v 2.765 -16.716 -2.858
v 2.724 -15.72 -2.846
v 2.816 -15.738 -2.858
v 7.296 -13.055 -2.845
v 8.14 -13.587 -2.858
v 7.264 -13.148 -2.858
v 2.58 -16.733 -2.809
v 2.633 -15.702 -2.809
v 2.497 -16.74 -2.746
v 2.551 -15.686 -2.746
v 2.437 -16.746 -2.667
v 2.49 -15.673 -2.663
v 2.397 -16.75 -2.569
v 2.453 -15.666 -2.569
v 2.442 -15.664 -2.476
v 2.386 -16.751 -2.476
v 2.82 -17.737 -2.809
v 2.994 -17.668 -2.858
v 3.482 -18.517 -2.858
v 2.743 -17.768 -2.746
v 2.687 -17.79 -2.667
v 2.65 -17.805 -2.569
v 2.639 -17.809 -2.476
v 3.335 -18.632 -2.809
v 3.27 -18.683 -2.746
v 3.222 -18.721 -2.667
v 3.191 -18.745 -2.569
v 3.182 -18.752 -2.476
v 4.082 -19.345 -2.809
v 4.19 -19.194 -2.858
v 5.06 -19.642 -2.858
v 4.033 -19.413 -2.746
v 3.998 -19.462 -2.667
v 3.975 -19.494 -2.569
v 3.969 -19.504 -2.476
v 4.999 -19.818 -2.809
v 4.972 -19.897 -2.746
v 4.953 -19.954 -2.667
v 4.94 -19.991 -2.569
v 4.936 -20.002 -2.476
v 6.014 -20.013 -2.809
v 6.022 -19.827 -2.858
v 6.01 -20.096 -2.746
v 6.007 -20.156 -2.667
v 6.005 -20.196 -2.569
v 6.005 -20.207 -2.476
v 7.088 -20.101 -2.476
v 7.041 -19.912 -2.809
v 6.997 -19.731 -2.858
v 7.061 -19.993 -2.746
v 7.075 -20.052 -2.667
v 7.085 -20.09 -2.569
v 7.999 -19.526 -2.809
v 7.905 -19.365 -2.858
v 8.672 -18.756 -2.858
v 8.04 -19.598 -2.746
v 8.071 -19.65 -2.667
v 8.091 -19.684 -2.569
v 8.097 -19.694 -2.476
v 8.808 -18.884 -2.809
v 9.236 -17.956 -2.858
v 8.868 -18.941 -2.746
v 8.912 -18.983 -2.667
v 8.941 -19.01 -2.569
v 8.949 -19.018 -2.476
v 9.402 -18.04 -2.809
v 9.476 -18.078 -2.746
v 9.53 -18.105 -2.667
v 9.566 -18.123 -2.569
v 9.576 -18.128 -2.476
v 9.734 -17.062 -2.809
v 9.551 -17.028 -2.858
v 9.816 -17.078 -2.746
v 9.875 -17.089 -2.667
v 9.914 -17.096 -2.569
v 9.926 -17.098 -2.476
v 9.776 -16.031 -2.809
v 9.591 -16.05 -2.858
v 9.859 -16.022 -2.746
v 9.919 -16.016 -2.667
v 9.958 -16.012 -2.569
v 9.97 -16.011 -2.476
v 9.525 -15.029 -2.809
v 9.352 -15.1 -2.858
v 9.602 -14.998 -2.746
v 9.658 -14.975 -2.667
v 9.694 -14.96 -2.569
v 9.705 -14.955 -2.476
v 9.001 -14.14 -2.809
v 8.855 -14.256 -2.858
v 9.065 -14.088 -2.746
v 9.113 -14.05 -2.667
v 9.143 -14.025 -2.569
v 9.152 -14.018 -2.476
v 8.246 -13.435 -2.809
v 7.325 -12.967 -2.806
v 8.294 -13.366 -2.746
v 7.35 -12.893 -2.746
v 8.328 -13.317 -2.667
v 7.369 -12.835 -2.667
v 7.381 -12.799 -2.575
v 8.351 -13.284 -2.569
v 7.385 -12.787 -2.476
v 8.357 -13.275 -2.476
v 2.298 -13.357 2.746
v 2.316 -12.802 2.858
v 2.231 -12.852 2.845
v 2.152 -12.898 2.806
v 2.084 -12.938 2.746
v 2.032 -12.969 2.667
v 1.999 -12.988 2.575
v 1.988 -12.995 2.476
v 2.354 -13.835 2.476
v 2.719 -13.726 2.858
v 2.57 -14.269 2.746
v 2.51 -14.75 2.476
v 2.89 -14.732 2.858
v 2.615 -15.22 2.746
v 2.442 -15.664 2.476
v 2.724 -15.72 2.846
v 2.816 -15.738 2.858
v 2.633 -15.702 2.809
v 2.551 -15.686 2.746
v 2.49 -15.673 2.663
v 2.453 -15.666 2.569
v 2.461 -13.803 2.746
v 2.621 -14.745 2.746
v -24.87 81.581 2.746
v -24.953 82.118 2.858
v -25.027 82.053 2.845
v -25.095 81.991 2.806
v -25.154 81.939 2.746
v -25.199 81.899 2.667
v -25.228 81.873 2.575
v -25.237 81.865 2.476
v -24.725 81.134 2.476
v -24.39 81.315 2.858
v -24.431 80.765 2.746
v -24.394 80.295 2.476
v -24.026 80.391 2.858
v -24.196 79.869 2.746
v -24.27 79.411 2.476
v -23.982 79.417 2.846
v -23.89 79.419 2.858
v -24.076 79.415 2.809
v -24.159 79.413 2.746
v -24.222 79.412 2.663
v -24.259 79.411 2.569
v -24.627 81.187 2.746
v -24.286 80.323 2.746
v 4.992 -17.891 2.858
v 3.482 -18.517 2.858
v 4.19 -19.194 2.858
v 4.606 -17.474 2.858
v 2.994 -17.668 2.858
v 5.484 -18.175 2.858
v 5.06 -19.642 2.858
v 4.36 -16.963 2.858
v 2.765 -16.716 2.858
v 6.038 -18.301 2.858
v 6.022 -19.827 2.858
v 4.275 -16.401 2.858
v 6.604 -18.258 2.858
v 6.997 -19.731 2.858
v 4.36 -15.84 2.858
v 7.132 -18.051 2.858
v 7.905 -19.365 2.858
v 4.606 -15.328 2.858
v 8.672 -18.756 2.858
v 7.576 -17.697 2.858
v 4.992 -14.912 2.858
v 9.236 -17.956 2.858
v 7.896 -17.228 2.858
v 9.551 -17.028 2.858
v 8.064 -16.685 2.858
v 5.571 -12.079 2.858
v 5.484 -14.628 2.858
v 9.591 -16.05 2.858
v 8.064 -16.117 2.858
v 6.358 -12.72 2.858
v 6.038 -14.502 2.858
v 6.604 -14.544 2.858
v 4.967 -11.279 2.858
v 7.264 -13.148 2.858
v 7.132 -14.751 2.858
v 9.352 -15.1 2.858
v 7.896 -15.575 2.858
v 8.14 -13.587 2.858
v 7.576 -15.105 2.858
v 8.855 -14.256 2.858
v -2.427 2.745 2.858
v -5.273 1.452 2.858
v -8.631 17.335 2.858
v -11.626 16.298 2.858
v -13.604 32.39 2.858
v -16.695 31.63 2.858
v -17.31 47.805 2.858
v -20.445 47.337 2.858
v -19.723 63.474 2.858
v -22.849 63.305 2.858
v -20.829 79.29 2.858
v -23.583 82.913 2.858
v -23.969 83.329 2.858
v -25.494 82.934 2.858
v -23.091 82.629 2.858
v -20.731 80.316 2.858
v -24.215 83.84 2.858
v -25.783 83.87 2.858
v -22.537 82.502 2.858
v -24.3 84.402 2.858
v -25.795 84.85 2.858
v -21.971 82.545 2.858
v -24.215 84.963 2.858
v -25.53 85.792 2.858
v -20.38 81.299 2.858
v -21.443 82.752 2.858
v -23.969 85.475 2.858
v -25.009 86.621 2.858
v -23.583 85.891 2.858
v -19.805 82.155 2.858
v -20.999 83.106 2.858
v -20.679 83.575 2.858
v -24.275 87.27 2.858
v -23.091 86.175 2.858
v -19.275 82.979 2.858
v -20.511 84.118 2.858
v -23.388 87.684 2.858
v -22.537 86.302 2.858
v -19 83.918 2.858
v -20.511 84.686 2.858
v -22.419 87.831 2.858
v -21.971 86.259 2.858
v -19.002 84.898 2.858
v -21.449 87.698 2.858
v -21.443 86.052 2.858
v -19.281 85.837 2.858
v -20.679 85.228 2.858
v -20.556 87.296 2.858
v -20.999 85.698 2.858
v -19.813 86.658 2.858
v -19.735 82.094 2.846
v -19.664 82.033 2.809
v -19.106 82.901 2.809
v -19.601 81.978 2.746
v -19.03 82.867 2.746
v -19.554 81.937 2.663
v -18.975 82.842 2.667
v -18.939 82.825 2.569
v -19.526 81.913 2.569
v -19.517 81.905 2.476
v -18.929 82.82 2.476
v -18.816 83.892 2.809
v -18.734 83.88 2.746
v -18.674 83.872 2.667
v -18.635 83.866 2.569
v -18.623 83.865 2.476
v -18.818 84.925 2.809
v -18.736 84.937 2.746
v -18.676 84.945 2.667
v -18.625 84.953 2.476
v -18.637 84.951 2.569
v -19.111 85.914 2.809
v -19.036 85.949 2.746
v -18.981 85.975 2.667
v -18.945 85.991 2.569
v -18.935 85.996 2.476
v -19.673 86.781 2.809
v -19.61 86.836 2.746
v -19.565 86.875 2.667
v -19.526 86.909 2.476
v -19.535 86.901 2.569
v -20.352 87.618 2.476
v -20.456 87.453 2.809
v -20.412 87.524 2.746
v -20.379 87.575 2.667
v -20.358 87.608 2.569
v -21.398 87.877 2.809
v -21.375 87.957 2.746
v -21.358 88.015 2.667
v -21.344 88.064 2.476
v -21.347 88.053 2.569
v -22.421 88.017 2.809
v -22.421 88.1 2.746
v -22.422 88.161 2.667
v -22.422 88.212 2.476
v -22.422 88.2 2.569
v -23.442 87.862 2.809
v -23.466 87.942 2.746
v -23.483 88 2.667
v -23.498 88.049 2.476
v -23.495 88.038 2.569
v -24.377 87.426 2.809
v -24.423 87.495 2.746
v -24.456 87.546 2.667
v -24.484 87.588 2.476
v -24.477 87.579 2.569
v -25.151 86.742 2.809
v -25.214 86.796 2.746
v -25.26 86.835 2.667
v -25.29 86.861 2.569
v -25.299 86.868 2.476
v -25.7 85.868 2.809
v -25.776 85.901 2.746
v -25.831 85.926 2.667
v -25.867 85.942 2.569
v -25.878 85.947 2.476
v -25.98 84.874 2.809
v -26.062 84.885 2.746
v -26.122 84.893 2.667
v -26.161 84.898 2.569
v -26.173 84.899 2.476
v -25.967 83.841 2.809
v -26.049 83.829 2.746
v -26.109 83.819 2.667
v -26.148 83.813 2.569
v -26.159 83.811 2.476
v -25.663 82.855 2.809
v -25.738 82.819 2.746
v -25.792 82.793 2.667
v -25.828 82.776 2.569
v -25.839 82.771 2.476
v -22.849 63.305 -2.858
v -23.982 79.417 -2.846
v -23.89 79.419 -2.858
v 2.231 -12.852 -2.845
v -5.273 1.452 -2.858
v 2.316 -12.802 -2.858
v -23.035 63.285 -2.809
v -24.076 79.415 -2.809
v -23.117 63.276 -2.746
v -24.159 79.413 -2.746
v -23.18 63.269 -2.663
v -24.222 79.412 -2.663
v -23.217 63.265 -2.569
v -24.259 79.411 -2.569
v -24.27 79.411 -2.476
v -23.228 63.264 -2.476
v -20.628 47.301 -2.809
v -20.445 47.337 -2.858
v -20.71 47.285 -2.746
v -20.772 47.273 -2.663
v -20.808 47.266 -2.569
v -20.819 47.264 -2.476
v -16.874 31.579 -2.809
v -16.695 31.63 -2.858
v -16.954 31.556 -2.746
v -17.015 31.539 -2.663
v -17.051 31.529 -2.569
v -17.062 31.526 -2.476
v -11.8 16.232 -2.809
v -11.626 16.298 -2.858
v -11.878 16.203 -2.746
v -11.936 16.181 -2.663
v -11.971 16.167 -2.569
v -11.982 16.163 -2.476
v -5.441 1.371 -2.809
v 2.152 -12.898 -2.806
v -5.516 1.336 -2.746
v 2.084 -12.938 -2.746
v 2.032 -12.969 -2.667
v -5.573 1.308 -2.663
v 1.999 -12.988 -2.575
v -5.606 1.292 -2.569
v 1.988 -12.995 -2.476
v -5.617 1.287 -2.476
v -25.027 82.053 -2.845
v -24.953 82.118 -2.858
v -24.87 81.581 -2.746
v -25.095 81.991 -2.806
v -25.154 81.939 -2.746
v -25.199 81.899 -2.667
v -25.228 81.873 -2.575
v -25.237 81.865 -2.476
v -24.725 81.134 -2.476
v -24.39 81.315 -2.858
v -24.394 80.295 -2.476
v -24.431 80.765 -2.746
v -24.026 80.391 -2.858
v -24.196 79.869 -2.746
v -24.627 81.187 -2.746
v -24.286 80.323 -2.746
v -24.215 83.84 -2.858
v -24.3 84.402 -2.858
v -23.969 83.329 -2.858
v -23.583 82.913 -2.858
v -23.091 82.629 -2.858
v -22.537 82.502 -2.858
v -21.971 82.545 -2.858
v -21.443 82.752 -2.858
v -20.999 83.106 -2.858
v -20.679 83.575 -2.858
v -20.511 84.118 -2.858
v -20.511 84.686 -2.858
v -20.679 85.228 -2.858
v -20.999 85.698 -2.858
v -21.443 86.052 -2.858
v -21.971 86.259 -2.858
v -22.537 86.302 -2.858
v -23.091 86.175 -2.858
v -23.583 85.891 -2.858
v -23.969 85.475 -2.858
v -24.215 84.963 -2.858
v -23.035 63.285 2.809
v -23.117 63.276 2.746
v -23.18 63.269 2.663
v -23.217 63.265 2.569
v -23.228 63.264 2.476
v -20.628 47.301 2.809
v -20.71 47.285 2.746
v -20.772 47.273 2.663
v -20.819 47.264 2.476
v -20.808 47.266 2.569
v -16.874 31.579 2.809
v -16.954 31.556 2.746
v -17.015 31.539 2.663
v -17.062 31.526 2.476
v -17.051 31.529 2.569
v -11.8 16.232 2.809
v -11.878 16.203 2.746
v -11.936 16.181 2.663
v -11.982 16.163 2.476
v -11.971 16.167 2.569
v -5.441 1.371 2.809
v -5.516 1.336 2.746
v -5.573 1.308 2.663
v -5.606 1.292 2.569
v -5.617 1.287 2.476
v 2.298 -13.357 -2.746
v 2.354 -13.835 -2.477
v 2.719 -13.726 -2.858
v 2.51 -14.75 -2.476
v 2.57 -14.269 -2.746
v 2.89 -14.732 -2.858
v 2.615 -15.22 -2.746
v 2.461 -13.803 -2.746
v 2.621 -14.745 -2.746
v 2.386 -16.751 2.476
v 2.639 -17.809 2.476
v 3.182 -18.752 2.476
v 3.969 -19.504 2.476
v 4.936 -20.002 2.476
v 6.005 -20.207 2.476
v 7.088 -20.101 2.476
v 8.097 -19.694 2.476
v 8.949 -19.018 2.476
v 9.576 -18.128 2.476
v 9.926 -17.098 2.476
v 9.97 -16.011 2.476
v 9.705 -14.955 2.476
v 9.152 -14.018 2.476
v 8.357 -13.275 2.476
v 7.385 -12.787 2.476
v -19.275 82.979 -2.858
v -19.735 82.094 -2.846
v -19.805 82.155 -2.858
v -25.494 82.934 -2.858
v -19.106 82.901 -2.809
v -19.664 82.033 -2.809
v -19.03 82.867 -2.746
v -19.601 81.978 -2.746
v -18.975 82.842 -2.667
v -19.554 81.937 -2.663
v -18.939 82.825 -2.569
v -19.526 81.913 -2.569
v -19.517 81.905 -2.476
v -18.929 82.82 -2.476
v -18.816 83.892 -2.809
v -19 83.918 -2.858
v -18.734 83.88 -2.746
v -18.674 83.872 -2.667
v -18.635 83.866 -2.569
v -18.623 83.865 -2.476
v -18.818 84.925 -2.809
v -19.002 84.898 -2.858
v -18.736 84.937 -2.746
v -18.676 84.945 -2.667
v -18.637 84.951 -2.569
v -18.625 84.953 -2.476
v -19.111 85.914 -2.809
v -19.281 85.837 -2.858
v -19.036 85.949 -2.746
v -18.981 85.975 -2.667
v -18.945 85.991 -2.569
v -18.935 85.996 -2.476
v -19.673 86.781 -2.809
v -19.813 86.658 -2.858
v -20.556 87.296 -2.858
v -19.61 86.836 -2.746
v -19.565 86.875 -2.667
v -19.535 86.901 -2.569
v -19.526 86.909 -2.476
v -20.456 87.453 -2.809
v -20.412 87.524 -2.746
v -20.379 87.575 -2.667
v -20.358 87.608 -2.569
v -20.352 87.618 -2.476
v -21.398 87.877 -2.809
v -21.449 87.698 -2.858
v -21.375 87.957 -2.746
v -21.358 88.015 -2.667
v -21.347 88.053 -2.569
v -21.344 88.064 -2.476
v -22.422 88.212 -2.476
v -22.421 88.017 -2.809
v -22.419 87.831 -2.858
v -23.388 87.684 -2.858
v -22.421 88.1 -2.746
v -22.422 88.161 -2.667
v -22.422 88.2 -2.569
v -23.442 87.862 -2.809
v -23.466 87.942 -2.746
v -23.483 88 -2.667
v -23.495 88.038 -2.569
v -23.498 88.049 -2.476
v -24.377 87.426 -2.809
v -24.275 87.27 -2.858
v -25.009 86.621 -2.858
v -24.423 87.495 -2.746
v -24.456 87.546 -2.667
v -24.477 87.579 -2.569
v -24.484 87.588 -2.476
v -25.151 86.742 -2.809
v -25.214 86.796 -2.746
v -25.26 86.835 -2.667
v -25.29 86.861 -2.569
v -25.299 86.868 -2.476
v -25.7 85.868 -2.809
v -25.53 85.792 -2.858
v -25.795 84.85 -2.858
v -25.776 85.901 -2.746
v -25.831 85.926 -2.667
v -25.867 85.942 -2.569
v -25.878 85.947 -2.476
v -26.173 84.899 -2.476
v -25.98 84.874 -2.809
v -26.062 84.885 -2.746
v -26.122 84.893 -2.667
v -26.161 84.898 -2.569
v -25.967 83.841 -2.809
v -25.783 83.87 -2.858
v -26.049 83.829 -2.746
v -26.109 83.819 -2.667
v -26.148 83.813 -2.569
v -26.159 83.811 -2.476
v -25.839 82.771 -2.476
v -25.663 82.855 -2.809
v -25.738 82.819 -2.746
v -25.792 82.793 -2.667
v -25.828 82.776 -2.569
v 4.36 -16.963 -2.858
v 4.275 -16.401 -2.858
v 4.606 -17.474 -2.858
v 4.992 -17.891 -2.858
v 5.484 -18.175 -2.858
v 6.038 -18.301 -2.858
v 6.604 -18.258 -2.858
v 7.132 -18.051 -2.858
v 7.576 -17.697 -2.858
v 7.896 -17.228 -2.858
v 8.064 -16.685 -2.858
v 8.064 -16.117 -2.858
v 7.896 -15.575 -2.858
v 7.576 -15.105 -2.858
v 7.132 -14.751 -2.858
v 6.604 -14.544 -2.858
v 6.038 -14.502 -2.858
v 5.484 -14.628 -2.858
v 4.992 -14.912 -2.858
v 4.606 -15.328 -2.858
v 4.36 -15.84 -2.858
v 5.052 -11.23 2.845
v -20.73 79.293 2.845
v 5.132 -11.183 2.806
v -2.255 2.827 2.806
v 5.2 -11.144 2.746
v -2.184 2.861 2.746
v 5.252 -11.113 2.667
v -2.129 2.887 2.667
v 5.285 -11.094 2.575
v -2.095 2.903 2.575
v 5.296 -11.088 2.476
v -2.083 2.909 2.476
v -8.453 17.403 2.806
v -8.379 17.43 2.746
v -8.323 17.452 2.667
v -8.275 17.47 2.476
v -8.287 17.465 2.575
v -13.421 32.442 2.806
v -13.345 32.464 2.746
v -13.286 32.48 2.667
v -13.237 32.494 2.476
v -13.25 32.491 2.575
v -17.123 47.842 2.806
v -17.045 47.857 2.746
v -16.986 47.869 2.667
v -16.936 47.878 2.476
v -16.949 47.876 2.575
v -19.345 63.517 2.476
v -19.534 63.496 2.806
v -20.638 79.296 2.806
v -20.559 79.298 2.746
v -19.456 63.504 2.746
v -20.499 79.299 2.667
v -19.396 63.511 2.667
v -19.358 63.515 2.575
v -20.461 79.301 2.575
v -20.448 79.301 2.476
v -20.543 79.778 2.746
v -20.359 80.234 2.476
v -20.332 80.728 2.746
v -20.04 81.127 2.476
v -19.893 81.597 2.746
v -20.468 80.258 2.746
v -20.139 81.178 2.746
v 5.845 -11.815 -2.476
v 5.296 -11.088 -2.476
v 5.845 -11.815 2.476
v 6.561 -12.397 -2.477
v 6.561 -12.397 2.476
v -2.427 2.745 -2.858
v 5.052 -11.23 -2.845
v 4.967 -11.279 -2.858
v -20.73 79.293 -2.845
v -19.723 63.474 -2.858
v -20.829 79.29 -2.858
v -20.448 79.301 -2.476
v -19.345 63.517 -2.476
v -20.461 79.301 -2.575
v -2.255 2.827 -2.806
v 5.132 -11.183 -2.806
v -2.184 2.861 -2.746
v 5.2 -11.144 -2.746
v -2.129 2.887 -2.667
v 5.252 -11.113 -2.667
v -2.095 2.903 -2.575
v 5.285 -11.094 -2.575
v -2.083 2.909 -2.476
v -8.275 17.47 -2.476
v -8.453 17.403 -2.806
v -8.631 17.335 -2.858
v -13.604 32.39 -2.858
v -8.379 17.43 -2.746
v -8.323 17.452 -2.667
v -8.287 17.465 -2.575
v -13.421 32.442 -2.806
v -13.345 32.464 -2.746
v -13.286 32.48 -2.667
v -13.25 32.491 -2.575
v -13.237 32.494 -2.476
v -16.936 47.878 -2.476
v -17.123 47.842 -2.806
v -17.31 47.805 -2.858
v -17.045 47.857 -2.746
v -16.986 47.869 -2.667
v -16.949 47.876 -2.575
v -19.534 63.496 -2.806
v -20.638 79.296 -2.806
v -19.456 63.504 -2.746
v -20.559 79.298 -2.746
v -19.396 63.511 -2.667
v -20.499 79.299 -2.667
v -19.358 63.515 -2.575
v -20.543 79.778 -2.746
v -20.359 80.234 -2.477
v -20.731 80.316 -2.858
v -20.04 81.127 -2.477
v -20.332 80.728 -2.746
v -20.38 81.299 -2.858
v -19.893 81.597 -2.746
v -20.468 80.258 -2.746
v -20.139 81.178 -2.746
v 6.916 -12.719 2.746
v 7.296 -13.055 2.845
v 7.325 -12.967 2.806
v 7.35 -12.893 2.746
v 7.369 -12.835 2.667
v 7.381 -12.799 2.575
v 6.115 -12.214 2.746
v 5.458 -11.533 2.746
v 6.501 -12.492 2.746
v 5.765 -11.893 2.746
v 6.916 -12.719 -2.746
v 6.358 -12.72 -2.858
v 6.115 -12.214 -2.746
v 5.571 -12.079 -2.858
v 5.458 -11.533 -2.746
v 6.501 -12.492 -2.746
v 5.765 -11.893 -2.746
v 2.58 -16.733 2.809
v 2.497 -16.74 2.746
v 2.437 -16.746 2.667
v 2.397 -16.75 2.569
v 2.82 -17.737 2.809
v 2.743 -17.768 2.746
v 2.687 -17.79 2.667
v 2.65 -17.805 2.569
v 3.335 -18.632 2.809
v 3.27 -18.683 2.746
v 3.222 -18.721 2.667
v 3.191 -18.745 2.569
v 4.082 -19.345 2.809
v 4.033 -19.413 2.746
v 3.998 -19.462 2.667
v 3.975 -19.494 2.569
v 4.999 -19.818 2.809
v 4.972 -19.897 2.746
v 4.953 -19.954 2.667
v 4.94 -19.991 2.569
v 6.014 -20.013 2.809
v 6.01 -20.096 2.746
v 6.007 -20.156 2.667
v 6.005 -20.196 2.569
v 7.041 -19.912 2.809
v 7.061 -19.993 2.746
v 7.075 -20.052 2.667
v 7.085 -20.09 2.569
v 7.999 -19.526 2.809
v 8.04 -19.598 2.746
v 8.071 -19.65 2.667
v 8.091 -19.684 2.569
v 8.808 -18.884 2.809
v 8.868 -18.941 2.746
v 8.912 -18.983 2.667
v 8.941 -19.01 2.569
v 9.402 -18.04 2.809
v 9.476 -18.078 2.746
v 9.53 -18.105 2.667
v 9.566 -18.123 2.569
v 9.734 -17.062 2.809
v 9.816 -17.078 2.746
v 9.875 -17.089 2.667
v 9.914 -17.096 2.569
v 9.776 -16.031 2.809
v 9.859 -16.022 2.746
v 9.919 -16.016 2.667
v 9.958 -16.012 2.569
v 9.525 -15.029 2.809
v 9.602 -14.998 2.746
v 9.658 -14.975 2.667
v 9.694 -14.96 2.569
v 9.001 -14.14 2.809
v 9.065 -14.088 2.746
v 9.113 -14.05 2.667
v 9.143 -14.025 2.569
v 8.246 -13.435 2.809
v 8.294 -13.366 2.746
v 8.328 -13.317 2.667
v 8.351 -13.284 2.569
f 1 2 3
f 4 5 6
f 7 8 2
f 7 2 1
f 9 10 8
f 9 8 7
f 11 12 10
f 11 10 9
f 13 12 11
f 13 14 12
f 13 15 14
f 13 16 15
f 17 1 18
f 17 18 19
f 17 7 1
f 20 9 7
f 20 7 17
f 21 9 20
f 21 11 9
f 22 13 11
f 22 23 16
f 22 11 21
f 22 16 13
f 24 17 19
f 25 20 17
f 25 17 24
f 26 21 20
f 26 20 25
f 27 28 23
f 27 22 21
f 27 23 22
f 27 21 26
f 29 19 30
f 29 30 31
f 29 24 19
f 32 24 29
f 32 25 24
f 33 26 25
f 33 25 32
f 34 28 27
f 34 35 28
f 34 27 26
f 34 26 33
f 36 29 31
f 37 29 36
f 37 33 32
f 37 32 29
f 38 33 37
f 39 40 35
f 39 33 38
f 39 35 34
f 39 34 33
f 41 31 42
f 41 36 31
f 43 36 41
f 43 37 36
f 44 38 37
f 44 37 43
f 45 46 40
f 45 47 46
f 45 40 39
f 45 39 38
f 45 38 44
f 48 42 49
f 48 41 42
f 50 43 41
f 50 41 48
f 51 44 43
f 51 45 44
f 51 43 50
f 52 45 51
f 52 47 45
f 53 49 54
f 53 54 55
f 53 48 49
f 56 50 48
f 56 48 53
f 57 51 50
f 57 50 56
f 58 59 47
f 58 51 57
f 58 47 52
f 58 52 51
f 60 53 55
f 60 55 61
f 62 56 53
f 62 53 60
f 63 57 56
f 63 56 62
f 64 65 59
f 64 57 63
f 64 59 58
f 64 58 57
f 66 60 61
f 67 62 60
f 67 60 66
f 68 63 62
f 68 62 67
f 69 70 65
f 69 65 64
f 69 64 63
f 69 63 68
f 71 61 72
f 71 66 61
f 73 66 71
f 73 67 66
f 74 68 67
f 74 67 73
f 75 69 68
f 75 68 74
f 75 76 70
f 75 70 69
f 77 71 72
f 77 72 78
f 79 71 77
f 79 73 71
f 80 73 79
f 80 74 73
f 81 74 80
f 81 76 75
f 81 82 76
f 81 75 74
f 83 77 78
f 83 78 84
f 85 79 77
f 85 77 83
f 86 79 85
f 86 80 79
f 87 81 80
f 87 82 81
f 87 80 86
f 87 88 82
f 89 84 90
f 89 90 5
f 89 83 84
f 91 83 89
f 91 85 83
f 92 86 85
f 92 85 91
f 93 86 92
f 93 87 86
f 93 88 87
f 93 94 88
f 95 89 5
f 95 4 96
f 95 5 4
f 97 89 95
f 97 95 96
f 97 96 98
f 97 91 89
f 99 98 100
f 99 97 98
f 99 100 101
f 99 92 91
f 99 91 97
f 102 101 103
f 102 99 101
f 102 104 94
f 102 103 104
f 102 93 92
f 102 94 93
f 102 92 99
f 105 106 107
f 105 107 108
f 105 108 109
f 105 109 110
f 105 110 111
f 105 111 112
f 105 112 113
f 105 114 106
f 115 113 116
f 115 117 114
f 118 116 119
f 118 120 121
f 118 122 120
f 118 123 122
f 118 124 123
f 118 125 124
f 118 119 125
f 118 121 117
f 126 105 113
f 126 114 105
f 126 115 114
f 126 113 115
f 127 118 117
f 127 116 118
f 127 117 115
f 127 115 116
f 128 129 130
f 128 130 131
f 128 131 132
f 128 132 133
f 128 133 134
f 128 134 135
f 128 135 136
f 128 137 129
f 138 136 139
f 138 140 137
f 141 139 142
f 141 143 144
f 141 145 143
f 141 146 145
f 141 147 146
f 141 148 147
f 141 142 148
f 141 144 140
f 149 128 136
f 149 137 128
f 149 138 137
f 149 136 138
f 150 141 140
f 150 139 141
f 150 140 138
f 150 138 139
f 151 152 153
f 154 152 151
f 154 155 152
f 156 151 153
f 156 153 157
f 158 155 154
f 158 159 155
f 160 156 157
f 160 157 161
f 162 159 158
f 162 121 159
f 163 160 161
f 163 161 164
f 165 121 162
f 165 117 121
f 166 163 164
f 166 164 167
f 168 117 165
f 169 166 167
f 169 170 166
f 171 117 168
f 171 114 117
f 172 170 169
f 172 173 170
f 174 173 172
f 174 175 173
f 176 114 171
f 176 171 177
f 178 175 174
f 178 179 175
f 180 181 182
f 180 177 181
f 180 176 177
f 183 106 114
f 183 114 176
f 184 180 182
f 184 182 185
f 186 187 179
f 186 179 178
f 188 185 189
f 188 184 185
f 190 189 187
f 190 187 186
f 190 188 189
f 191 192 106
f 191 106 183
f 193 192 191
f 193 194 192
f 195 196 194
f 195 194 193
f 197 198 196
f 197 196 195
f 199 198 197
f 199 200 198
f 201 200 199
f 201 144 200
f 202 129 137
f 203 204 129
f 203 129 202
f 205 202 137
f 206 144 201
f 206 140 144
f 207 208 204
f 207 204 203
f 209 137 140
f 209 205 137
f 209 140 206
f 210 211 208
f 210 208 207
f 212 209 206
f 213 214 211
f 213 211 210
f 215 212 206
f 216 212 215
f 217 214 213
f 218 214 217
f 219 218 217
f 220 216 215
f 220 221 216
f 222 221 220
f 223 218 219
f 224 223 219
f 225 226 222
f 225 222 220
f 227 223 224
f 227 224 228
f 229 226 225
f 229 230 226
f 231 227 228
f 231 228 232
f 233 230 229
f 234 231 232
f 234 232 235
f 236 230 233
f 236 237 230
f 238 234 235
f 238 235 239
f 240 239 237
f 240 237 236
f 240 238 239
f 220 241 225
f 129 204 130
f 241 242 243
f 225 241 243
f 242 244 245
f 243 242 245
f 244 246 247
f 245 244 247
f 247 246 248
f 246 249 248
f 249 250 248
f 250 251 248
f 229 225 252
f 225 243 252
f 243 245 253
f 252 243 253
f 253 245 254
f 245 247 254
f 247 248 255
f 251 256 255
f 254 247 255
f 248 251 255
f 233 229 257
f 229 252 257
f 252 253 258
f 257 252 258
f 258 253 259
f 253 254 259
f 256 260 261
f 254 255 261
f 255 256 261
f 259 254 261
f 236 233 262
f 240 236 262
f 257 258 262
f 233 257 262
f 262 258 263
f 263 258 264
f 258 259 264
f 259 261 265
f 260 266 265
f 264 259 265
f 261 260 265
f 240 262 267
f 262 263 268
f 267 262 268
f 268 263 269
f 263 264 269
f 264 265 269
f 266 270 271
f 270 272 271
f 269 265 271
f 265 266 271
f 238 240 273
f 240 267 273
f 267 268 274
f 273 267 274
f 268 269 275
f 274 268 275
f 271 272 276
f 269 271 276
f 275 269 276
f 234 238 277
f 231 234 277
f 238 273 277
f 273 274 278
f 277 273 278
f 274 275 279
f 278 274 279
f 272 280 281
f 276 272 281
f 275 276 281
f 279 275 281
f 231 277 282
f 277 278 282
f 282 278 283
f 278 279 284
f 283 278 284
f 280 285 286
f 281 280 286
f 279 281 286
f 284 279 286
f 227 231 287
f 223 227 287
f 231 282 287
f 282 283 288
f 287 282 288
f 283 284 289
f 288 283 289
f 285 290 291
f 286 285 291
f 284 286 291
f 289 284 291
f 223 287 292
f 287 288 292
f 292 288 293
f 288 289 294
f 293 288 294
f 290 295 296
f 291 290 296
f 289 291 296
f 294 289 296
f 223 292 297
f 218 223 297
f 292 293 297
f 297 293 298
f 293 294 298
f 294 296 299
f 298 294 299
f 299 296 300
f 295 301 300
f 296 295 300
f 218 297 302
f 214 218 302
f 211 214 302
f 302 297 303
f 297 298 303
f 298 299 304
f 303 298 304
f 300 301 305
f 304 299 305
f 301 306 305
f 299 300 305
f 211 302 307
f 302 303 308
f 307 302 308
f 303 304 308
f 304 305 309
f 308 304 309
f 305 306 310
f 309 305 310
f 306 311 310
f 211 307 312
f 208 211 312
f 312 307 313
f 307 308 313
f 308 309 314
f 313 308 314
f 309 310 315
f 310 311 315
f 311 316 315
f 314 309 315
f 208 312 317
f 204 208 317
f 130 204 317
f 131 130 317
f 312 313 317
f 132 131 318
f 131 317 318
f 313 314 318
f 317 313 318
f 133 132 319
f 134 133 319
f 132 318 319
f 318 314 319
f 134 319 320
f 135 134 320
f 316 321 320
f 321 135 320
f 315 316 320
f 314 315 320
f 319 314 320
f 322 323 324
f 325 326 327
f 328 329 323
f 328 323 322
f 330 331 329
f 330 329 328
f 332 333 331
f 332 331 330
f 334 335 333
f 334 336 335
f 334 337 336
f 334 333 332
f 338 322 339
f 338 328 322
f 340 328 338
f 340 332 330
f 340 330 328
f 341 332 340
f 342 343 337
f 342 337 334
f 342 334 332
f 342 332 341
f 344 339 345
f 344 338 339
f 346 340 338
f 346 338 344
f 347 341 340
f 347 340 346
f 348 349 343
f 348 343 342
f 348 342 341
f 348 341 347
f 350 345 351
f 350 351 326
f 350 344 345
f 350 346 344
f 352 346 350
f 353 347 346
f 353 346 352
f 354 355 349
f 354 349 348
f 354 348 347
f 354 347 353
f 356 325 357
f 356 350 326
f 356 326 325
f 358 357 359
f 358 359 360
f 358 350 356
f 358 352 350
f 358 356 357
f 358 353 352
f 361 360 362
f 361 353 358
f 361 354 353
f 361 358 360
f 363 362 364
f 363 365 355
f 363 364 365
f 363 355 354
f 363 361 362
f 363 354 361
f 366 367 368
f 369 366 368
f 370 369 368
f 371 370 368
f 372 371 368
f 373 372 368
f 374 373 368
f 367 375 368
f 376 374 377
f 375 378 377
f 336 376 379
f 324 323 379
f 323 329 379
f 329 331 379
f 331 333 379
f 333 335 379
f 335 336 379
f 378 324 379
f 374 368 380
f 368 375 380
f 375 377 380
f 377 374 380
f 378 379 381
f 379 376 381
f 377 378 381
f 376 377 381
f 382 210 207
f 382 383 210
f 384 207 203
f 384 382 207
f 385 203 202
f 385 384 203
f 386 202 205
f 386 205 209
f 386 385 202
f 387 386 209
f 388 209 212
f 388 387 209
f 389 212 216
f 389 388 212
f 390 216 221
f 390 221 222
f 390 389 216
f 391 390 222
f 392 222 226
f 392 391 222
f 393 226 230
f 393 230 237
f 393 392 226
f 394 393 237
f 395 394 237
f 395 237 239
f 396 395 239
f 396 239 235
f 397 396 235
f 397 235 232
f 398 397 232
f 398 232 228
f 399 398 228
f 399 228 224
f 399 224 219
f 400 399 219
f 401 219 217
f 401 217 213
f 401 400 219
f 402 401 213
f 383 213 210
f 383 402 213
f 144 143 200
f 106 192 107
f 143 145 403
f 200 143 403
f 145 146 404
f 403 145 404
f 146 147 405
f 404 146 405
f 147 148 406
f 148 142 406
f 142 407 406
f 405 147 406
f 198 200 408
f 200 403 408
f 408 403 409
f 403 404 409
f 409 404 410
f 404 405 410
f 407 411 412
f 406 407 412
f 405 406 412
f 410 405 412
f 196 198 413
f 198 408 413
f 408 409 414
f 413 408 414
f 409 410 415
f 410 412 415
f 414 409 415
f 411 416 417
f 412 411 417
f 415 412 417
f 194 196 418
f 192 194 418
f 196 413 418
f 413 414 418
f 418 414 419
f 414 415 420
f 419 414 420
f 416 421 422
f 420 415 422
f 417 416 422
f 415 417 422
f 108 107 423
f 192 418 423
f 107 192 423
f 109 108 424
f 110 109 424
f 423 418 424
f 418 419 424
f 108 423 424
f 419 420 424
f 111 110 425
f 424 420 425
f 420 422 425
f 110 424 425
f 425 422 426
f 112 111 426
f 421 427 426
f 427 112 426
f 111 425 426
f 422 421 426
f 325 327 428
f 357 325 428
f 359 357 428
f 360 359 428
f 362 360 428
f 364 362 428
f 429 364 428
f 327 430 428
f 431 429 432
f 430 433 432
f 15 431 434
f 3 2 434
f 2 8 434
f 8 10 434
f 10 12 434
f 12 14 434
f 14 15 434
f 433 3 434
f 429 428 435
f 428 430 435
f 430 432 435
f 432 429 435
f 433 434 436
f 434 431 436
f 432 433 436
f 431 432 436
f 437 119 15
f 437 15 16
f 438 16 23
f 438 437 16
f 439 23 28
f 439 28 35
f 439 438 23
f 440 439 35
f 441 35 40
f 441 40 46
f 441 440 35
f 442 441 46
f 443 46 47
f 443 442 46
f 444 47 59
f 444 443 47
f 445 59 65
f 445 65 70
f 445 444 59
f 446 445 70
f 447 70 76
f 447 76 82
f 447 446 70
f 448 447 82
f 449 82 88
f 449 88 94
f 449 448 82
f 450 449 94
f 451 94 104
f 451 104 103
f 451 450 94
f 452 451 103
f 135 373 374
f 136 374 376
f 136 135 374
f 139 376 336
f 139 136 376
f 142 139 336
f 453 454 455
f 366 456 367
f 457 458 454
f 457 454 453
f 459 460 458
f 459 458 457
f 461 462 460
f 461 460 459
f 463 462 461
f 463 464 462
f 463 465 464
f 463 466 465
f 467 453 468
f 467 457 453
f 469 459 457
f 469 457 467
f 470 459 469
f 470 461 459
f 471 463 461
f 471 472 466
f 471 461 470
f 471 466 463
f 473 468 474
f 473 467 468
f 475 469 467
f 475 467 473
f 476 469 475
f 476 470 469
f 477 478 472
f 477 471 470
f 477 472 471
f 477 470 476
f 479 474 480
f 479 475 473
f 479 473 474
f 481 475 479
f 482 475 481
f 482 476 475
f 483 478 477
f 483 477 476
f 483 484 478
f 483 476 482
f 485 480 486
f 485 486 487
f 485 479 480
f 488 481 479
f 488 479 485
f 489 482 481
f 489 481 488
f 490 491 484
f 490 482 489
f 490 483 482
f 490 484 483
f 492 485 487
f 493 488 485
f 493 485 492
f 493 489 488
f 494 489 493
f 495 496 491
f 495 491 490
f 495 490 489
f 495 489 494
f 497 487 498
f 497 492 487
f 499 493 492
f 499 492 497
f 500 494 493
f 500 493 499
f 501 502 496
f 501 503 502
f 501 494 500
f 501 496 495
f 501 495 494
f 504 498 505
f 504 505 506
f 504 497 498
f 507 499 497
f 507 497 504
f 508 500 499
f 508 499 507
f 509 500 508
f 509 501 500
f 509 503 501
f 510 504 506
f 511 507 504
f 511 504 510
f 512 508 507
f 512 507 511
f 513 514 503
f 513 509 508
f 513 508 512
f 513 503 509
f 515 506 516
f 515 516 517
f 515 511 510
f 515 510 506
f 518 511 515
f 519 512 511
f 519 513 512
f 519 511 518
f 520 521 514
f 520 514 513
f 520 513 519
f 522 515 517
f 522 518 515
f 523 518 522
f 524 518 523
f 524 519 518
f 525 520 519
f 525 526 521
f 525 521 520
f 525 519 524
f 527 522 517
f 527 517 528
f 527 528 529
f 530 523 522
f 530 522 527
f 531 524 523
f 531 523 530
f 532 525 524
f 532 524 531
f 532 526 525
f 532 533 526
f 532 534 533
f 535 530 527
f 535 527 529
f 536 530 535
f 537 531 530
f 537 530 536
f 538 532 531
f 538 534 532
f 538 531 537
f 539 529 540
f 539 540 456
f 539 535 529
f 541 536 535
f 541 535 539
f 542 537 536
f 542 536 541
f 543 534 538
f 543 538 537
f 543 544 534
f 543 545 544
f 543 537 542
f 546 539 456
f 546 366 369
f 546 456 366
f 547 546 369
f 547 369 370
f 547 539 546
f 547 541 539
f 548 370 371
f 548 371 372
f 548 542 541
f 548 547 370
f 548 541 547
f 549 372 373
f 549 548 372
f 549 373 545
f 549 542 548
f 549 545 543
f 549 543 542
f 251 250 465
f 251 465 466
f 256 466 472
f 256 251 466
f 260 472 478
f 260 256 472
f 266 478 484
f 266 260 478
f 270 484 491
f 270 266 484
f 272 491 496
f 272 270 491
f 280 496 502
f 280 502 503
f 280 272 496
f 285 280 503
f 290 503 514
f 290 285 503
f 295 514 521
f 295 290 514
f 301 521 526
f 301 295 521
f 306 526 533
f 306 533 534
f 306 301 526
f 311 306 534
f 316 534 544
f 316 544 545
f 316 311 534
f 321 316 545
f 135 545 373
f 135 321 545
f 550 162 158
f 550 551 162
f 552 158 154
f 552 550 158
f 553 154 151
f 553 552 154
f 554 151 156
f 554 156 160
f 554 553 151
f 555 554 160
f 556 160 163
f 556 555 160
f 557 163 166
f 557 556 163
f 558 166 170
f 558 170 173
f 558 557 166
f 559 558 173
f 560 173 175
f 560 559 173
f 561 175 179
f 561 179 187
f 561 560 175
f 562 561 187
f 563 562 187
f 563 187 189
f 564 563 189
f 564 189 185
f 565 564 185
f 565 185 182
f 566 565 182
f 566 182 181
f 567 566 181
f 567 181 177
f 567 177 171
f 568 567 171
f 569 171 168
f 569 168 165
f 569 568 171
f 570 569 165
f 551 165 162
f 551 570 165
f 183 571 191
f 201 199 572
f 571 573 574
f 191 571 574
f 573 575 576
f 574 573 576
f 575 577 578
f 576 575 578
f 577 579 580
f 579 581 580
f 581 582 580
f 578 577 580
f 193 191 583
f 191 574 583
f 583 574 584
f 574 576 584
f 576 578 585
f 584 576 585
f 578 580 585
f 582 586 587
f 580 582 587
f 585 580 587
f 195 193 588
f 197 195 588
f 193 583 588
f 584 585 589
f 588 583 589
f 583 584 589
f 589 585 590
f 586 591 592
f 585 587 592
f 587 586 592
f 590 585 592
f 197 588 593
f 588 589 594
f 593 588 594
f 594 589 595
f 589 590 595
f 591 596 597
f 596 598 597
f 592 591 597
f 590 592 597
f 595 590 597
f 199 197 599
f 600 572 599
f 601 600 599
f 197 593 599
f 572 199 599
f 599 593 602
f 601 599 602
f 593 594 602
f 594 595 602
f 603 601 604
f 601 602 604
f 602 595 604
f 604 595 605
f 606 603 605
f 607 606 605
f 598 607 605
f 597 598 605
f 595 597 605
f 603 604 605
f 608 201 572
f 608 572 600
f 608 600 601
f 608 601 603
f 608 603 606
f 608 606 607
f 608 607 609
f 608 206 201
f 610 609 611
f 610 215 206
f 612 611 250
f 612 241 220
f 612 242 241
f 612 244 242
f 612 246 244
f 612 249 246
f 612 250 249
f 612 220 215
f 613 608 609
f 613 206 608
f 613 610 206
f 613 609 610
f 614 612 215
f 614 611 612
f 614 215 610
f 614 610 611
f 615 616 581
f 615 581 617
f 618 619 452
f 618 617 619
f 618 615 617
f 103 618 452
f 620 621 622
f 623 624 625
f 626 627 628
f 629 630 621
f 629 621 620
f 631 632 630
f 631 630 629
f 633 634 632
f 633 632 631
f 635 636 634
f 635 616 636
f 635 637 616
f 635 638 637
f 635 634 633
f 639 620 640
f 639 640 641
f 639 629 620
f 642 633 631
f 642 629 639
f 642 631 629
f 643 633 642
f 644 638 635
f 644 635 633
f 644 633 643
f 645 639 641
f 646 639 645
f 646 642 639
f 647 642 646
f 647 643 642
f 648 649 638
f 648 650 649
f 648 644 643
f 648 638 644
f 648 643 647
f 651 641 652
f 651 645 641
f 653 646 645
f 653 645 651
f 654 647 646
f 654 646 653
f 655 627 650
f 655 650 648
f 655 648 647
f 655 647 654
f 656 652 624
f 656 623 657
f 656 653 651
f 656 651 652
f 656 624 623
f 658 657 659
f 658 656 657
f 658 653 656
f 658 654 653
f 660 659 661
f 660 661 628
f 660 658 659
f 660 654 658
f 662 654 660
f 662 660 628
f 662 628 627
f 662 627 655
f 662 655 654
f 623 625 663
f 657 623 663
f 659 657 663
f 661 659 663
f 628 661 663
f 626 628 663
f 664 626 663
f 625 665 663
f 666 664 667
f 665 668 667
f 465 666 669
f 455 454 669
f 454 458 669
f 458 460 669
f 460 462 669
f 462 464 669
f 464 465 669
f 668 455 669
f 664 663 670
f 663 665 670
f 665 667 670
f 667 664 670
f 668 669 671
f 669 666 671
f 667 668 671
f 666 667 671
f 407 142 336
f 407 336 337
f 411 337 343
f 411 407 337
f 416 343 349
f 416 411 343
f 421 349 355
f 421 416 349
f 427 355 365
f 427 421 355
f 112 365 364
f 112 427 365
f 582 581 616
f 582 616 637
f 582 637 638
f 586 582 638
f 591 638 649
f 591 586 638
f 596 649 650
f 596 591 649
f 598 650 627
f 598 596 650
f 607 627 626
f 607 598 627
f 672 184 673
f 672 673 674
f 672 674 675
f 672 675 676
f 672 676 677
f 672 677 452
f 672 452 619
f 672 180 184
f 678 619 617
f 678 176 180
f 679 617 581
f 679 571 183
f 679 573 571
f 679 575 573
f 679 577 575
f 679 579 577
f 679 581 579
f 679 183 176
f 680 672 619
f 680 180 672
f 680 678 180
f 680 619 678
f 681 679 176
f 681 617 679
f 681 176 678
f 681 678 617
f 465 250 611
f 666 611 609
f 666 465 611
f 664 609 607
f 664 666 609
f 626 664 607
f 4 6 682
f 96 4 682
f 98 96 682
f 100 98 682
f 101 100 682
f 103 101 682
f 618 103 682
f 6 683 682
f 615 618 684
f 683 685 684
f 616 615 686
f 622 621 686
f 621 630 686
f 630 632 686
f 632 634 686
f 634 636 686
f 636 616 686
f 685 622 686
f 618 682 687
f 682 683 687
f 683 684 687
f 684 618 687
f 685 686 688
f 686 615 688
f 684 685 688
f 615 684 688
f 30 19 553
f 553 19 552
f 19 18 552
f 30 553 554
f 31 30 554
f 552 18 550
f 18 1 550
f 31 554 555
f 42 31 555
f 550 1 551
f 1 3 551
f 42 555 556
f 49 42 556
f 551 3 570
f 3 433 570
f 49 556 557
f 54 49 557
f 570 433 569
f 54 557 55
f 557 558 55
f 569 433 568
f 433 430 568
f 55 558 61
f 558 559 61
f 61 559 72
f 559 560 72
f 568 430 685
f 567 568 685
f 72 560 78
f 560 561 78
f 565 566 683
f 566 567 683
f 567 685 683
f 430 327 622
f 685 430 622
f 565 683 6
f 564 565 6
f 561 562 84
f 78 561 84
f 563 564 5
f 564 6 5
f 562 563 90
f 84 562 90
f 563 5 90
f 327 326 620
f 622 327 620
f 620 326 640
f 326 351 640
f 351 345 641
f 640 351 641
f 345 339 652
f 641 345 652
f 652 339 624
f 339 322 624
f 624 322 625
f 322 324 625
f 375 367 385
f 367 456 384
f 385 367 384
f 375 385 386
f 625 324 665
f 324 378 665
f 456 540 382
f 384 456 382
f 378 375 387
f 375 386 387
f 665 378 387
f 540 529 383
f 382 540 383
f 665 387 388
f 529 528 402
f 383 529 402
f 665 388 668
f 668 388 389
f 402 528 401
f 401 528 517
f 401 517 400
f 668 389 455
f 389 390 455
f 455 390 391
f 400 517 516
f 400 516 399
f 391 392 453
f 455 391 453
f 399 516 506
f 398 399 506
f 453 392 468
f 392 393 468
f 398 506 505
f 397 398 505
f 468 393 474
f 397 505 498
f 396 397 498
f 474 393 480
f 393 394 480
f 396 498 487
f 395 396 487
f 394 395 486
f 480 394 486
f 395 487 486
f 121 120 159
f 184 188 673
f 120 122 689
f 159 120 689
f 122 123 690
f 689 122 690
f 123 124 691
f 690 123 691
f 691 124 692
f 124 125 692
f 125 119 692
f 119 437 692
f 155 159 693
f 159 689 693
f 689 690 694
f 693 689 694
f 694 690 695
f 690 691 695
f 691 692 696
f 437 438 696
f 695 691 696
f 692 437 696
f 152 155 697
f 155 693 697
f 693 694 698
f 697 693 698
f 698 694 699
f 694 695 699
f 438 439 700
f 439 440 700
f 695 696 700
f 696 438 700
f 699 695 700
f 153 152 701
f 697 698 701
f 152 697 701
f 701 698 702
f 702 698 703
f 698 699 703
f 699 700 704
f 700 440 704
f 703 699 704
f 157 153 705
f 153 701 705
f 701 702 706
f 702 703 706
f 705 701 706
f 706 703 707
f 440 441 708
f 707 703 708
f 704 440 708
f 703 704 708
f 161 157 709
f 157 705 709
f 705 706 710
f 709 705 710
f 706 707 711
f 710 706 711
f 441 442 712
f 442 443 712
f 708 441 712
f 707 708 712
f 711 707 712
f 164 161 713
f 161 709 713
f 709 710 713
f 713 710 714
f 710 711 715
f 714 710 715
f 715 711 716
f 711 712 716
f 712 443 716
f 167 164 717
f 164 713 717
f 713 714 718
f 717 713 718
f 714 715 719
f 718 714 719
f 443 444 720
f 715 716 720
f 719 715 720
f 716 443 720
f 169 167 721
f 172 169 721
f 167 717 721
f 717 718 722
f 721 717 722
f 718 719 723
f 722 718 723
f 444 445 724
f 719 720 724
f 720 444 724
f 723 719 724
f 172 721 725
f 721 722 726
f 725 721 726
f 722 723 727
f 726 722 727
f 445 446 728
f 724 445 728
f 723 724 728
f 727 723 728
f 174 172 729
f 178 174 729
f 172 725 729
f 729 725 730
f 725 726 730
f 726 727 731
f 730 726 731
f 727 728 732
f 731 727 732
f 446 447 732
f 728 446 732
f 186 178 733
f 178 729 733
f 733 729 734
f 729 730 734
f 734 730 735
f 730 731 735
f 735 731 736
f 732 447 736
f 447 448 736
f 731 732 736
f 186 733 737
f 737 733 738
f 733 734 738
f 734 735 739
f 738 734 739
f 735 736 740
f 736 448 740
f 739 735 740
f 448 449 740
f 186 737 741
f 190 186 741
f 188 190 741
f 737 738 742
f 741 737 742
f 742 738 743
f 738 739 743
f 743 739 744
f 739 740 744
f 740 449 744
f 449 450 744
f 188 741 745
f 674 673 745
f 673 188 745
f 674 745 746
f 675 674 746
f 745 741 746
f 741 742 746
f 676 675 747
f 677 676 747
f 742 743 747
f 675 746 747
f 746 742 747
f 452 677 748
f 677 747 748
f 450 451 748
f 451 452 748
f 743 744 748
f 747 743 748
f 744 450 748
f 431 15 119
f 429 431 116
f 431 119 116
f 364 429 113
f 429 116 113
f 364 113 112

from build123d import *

# Parameters (mm, degrees)
SKETCH1_R           = 1.27
BOSS_EXTRUDE1_DEPTH = 1.905
FILLET1_R           = 2.54
FILLET2_R           = 0.254
SCALE1_SCALE        = 1.5


with BuildPart() as part:
    # Sketch1 → Boss-Extrude1 (new, symmetric)
    with BuildSketch(Plane.XY):
        with BuildLine():
            ThreePointArc((-17.78, 65.002378775), (-19.05, 69.742083301), (-20.32, 65.002378775))
            ThreePointArc((-20.32, 65.002378775), (-15.489369755, 31.933659243), (-2.199704526, 1.27))
            ThreePointArc((-2.199704526, 1.27), (1.27, -2.199704526), (0, 2.54))
            ThreePointArc((0, 2.54), (-12.950130529, 32.61546778), (-17.78, 65.002378775))
        make_face()
        with Locations(Location((-19.05, 67.202083301, 0), (0, 0, 180))):
            Circle(SKETCH1_R, mode=Mode.SUBTRACT)
        with Locations(Location((0, 0, 0), (0, 0, 180))):
            Circle(SKETCH1_R, mode=Mode.SUBTRACT)
    extrude(amount=BOSS_EXTRUDE1_DEPTH, both=True)

    # Fillet1
    fillet1_edges = [part.edges().sort_by_distance(p)[0] for p in [
        (0, 2.54, 0),
        (-2.199704526, 1.27, 0),
        (-20.32, 65.002378775, 0),
        (-17.78, 65.002378775, 0),
    ]]
    fillet(fillet1_edges, radius=FILLET1_R)

    # Fillet2
    fillet2_edges = [part.edges().sort_by_distance(p)[0] for p in [
        (-12.944837831, 32.596879535, -1.905),
        (-12.944837831, 32.596879535, 1.905),
        (1.277759543, -2.195206266, -1.905),
        (1.277759543, -2.195206266, 1.905),
        (-15.494383054, 31.951296771, -1.905),
        (-15.494383054, 31.951296771, 1.905),
        (-19.068010515, 69.742019446, -1.905),
        (-19.068010515, 69.742019446, 1.905),
        (0.003745513, 2.848900008, -1.905),
        (0.003745513, 2.848900008, 1.905),
        (-2.479958878, 1.409004676, -1.905),
        (-2.479958878, 1.409004676, 1.905),
        (-20.47647458, 64.750228521, -1.905),
        (-20.47647458, 64.750228521, 1.905),
        (-17.604676807, 64.727772481, -1.905),
        (-17.604676807, 64.727772481, 1.905),
    ]]
    fillet(fillet2_edges, radius=FILLET2_R)


with BuildPart() as part_1:
    # Scale1: scaled about (-12.359782822, 32.802390244, 0)
    add(part.part.scale(SCALE1_SCALE).moved(Location((6.179891411, -16.401195122, 0))))


solid = part_1.part
